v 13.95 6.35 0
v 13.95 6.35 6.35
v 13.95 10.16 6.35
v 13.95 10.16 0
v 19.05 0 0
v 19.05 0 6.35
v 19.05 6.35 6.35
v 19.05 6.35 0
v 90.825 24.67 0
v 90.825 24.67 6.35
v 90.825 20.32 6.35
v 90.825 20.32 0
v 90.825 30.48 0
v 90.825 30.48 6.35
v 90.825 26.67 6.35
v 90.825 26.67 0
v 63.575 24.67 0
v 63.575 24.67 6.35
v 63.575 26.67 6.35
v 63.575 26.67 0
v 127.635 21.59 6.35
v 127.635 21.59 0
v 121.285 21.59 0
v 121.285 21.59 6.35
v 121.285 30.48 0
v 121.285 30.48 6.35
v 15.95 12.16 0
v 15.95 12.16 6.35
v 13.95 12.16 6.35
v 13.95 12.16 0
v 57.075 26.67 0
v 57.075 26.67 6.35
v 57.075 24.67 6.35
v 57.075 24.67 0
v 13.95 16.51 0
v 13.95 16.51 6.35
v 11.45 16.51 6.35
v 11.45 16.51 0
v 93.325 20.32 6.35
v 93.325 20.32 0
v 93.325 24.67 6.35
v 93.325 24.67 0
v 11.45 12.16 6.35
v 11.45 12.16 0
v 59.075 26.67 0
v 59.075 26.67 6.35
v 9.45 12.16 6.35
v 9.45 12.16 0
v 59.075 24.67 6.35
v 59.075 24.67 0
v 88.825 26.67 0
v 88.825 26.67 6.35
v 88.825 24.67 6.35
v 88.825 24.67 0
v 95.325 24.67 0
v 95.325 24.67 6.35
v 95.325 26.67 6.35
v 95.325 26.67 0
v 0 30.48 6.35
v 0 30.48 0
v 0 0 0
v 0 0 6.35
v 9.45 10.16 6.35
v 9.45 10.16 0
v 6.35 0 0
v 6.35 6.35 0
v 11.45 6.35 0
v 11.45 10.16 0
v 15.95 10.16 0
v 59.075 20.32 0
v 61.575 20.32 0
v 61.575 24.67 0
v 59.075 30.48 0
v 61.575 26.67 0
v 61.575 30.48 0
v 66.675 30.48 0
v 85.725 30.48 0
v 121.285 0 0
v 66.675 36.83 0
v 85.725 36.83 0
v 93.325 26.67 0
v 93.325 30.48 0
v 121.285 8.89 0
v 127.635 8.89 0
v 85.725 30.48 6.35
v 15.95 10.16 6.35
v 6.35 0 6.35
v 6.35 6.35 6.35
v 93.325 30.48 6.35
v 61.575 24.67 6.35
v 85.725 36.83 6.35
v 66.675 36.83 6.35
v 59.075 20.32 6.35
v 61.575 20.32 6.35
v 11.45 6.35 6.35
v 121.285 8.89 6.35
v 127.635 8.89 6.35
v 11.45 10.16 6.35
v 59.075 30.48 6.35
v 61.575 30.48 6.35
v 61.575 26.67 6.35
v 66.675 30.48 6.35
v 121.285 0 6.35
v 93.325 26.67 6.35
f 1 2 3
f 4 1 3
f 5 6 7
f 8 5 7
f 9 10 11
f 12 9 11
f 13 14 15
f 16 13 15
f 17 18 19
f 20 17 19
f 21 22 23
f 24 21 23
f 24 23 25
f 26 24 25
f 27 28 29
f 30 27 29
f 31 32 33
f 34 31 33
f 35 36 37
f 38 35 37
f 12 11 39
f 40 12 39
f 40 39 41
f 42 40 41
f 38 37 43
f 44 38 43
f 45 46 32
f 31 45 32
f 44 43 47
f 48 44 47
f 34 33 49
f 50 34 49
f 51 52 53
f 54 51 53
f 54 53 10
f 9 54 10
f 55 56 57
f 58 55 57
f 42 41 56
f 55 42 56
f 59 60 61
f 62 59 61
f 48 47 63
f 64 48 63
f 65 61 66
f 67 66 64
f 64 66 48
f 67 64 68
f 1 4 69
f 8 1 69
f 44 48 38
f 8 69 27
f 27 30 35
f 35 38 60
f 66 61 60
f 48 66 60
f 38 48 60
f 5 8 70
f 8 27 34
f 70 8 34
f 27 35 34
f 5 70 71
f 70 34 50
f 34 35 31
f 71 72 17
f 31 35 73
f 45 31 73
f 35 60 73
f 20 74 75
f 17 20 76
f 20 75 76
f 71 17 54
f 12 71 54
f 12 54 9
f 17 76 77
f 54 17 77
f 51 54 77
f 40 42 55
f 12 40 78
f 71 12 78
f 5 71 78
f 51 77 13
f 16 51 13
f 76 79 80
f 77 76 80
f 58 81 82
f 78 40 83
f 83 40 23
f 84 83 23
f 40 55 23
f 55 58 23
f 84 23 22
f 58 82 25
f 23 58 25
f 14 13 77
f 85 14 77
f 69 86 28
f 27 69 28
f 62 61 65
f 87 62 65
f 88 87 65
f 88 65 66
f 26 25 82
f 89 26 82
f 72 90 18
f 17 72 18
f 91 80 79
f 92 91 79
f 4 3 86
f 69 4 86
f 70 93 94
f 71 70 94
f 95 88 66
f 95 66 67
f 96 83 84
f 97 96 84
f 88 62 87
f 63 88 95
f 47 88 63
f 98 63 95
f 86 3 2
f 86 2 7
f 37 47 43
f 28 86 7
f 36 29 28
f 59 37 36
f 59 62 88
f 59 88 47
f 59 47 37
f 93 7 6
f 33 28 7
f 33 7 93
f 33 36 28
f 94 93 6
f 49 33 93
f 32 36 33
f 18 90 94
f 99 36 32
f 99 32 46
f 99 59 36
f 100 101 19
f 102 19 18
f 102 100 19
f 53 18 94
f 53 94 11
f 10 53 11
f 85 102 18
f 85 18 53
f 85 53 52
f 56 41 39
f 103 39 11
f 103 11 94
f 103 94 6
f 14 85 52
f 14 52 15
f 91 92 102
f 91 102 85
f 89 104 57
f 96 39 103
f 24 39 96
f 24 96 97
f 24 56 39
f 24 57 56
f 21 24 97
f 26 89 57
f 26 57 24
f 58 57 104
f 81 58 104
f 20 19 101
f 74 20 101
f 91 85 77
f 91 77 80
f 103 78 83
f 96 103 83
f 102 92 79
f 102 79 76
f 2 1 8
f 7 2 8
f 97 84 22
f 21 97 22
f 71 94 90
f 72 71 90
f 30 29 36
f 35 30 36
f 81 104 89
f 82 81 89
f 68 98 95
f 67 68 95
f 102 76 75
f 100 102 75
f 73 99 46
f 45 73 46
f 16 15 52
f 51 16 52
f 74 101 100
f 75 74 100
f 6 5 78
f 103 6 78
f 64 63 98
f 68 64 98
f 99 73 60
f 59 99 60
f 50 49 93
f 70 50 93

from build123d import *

# Parameters (mm, degrees)
BOSS_EXTRUDE1_DEPTH = 6.35
SKETCH2_W           = 12.7
SKETCH2_H           = 6.35
CUT_EXTRUDE1_DEPTH  = 7.35
CUT_EXTRUDE5_DEPTH  = 7.35


with BuildPart() as part:
    # Sketch1 → Boss-Extrude1 (new body)
    with BuildSketch(Plane.XY):
        Polygon((66.675, 30.48), (0, 30.48), (0, 0), (121.285, 0), (121.285, 8.89), (127.635, 8.89), (127.635, 21.59), (121.285, 21.59), (121.285, 30.48), (85.725, 30.48), (85.725, 36.83), (66.675, 36.83), align=None)
    extrude(amount=BOSS_EXTRUDE1_DEPTH)

    # Sketch2 → Cut-Extrude1 (cut, through all)
    with BuildSketch(Plane.XY.offset(6.35)):
        with Locations((12.7, 3.175)):
            Rectangle(SKETCH2_W, SKETCH2_H)
    extrude(amount=-CUT_EXTRUDE1_DEPTH, mode=Mode.SUBTRACT)

    # Sketch5 → Cut-Extrude5 (cut, through all)
    with BuildSketch(Plane.XY.offset(6.35)):
        Polygon((61.575, 30.48), (59.075, 30.48), (59.075, 26.67), (57.075, 26.67), (57.075, 24.67), (59.075, 24.67), (59.075, 20.32), (61.575, 20.32), (61.575, 24.67), (63.575, 24.67), (63.575, 26.67), (61.575, 26.67), align=None)
        Polygon((90.825, 26.67), (88.825, 26.67), (88.825, 24.67), (90.825, 24.67), (90.825, 20.32), (93.325, 20.32), (93.325, 24.67), (95.325, 24.67), (95.325, 26.67), (93.325, 26.67), (93.325, 30.48), (90.825, 30.48), align=None)
        Polygon((11.45, 10.16), (11.45, 6.35), (13.95, 6.35), (13.95, 10.16), (15.95, 10.16), (15.95, 12.16), (13.95, 12.16), (13.95, 16.51), (11.45, 16.51), (11.45, 12.16), (9.45, 12.16), (9.45, 10.16), align=None)
    extrude(amount=-CUT_EXTRUDE5_DEPTH, mode=Mode.SUBTRACT)


solid = part.part
